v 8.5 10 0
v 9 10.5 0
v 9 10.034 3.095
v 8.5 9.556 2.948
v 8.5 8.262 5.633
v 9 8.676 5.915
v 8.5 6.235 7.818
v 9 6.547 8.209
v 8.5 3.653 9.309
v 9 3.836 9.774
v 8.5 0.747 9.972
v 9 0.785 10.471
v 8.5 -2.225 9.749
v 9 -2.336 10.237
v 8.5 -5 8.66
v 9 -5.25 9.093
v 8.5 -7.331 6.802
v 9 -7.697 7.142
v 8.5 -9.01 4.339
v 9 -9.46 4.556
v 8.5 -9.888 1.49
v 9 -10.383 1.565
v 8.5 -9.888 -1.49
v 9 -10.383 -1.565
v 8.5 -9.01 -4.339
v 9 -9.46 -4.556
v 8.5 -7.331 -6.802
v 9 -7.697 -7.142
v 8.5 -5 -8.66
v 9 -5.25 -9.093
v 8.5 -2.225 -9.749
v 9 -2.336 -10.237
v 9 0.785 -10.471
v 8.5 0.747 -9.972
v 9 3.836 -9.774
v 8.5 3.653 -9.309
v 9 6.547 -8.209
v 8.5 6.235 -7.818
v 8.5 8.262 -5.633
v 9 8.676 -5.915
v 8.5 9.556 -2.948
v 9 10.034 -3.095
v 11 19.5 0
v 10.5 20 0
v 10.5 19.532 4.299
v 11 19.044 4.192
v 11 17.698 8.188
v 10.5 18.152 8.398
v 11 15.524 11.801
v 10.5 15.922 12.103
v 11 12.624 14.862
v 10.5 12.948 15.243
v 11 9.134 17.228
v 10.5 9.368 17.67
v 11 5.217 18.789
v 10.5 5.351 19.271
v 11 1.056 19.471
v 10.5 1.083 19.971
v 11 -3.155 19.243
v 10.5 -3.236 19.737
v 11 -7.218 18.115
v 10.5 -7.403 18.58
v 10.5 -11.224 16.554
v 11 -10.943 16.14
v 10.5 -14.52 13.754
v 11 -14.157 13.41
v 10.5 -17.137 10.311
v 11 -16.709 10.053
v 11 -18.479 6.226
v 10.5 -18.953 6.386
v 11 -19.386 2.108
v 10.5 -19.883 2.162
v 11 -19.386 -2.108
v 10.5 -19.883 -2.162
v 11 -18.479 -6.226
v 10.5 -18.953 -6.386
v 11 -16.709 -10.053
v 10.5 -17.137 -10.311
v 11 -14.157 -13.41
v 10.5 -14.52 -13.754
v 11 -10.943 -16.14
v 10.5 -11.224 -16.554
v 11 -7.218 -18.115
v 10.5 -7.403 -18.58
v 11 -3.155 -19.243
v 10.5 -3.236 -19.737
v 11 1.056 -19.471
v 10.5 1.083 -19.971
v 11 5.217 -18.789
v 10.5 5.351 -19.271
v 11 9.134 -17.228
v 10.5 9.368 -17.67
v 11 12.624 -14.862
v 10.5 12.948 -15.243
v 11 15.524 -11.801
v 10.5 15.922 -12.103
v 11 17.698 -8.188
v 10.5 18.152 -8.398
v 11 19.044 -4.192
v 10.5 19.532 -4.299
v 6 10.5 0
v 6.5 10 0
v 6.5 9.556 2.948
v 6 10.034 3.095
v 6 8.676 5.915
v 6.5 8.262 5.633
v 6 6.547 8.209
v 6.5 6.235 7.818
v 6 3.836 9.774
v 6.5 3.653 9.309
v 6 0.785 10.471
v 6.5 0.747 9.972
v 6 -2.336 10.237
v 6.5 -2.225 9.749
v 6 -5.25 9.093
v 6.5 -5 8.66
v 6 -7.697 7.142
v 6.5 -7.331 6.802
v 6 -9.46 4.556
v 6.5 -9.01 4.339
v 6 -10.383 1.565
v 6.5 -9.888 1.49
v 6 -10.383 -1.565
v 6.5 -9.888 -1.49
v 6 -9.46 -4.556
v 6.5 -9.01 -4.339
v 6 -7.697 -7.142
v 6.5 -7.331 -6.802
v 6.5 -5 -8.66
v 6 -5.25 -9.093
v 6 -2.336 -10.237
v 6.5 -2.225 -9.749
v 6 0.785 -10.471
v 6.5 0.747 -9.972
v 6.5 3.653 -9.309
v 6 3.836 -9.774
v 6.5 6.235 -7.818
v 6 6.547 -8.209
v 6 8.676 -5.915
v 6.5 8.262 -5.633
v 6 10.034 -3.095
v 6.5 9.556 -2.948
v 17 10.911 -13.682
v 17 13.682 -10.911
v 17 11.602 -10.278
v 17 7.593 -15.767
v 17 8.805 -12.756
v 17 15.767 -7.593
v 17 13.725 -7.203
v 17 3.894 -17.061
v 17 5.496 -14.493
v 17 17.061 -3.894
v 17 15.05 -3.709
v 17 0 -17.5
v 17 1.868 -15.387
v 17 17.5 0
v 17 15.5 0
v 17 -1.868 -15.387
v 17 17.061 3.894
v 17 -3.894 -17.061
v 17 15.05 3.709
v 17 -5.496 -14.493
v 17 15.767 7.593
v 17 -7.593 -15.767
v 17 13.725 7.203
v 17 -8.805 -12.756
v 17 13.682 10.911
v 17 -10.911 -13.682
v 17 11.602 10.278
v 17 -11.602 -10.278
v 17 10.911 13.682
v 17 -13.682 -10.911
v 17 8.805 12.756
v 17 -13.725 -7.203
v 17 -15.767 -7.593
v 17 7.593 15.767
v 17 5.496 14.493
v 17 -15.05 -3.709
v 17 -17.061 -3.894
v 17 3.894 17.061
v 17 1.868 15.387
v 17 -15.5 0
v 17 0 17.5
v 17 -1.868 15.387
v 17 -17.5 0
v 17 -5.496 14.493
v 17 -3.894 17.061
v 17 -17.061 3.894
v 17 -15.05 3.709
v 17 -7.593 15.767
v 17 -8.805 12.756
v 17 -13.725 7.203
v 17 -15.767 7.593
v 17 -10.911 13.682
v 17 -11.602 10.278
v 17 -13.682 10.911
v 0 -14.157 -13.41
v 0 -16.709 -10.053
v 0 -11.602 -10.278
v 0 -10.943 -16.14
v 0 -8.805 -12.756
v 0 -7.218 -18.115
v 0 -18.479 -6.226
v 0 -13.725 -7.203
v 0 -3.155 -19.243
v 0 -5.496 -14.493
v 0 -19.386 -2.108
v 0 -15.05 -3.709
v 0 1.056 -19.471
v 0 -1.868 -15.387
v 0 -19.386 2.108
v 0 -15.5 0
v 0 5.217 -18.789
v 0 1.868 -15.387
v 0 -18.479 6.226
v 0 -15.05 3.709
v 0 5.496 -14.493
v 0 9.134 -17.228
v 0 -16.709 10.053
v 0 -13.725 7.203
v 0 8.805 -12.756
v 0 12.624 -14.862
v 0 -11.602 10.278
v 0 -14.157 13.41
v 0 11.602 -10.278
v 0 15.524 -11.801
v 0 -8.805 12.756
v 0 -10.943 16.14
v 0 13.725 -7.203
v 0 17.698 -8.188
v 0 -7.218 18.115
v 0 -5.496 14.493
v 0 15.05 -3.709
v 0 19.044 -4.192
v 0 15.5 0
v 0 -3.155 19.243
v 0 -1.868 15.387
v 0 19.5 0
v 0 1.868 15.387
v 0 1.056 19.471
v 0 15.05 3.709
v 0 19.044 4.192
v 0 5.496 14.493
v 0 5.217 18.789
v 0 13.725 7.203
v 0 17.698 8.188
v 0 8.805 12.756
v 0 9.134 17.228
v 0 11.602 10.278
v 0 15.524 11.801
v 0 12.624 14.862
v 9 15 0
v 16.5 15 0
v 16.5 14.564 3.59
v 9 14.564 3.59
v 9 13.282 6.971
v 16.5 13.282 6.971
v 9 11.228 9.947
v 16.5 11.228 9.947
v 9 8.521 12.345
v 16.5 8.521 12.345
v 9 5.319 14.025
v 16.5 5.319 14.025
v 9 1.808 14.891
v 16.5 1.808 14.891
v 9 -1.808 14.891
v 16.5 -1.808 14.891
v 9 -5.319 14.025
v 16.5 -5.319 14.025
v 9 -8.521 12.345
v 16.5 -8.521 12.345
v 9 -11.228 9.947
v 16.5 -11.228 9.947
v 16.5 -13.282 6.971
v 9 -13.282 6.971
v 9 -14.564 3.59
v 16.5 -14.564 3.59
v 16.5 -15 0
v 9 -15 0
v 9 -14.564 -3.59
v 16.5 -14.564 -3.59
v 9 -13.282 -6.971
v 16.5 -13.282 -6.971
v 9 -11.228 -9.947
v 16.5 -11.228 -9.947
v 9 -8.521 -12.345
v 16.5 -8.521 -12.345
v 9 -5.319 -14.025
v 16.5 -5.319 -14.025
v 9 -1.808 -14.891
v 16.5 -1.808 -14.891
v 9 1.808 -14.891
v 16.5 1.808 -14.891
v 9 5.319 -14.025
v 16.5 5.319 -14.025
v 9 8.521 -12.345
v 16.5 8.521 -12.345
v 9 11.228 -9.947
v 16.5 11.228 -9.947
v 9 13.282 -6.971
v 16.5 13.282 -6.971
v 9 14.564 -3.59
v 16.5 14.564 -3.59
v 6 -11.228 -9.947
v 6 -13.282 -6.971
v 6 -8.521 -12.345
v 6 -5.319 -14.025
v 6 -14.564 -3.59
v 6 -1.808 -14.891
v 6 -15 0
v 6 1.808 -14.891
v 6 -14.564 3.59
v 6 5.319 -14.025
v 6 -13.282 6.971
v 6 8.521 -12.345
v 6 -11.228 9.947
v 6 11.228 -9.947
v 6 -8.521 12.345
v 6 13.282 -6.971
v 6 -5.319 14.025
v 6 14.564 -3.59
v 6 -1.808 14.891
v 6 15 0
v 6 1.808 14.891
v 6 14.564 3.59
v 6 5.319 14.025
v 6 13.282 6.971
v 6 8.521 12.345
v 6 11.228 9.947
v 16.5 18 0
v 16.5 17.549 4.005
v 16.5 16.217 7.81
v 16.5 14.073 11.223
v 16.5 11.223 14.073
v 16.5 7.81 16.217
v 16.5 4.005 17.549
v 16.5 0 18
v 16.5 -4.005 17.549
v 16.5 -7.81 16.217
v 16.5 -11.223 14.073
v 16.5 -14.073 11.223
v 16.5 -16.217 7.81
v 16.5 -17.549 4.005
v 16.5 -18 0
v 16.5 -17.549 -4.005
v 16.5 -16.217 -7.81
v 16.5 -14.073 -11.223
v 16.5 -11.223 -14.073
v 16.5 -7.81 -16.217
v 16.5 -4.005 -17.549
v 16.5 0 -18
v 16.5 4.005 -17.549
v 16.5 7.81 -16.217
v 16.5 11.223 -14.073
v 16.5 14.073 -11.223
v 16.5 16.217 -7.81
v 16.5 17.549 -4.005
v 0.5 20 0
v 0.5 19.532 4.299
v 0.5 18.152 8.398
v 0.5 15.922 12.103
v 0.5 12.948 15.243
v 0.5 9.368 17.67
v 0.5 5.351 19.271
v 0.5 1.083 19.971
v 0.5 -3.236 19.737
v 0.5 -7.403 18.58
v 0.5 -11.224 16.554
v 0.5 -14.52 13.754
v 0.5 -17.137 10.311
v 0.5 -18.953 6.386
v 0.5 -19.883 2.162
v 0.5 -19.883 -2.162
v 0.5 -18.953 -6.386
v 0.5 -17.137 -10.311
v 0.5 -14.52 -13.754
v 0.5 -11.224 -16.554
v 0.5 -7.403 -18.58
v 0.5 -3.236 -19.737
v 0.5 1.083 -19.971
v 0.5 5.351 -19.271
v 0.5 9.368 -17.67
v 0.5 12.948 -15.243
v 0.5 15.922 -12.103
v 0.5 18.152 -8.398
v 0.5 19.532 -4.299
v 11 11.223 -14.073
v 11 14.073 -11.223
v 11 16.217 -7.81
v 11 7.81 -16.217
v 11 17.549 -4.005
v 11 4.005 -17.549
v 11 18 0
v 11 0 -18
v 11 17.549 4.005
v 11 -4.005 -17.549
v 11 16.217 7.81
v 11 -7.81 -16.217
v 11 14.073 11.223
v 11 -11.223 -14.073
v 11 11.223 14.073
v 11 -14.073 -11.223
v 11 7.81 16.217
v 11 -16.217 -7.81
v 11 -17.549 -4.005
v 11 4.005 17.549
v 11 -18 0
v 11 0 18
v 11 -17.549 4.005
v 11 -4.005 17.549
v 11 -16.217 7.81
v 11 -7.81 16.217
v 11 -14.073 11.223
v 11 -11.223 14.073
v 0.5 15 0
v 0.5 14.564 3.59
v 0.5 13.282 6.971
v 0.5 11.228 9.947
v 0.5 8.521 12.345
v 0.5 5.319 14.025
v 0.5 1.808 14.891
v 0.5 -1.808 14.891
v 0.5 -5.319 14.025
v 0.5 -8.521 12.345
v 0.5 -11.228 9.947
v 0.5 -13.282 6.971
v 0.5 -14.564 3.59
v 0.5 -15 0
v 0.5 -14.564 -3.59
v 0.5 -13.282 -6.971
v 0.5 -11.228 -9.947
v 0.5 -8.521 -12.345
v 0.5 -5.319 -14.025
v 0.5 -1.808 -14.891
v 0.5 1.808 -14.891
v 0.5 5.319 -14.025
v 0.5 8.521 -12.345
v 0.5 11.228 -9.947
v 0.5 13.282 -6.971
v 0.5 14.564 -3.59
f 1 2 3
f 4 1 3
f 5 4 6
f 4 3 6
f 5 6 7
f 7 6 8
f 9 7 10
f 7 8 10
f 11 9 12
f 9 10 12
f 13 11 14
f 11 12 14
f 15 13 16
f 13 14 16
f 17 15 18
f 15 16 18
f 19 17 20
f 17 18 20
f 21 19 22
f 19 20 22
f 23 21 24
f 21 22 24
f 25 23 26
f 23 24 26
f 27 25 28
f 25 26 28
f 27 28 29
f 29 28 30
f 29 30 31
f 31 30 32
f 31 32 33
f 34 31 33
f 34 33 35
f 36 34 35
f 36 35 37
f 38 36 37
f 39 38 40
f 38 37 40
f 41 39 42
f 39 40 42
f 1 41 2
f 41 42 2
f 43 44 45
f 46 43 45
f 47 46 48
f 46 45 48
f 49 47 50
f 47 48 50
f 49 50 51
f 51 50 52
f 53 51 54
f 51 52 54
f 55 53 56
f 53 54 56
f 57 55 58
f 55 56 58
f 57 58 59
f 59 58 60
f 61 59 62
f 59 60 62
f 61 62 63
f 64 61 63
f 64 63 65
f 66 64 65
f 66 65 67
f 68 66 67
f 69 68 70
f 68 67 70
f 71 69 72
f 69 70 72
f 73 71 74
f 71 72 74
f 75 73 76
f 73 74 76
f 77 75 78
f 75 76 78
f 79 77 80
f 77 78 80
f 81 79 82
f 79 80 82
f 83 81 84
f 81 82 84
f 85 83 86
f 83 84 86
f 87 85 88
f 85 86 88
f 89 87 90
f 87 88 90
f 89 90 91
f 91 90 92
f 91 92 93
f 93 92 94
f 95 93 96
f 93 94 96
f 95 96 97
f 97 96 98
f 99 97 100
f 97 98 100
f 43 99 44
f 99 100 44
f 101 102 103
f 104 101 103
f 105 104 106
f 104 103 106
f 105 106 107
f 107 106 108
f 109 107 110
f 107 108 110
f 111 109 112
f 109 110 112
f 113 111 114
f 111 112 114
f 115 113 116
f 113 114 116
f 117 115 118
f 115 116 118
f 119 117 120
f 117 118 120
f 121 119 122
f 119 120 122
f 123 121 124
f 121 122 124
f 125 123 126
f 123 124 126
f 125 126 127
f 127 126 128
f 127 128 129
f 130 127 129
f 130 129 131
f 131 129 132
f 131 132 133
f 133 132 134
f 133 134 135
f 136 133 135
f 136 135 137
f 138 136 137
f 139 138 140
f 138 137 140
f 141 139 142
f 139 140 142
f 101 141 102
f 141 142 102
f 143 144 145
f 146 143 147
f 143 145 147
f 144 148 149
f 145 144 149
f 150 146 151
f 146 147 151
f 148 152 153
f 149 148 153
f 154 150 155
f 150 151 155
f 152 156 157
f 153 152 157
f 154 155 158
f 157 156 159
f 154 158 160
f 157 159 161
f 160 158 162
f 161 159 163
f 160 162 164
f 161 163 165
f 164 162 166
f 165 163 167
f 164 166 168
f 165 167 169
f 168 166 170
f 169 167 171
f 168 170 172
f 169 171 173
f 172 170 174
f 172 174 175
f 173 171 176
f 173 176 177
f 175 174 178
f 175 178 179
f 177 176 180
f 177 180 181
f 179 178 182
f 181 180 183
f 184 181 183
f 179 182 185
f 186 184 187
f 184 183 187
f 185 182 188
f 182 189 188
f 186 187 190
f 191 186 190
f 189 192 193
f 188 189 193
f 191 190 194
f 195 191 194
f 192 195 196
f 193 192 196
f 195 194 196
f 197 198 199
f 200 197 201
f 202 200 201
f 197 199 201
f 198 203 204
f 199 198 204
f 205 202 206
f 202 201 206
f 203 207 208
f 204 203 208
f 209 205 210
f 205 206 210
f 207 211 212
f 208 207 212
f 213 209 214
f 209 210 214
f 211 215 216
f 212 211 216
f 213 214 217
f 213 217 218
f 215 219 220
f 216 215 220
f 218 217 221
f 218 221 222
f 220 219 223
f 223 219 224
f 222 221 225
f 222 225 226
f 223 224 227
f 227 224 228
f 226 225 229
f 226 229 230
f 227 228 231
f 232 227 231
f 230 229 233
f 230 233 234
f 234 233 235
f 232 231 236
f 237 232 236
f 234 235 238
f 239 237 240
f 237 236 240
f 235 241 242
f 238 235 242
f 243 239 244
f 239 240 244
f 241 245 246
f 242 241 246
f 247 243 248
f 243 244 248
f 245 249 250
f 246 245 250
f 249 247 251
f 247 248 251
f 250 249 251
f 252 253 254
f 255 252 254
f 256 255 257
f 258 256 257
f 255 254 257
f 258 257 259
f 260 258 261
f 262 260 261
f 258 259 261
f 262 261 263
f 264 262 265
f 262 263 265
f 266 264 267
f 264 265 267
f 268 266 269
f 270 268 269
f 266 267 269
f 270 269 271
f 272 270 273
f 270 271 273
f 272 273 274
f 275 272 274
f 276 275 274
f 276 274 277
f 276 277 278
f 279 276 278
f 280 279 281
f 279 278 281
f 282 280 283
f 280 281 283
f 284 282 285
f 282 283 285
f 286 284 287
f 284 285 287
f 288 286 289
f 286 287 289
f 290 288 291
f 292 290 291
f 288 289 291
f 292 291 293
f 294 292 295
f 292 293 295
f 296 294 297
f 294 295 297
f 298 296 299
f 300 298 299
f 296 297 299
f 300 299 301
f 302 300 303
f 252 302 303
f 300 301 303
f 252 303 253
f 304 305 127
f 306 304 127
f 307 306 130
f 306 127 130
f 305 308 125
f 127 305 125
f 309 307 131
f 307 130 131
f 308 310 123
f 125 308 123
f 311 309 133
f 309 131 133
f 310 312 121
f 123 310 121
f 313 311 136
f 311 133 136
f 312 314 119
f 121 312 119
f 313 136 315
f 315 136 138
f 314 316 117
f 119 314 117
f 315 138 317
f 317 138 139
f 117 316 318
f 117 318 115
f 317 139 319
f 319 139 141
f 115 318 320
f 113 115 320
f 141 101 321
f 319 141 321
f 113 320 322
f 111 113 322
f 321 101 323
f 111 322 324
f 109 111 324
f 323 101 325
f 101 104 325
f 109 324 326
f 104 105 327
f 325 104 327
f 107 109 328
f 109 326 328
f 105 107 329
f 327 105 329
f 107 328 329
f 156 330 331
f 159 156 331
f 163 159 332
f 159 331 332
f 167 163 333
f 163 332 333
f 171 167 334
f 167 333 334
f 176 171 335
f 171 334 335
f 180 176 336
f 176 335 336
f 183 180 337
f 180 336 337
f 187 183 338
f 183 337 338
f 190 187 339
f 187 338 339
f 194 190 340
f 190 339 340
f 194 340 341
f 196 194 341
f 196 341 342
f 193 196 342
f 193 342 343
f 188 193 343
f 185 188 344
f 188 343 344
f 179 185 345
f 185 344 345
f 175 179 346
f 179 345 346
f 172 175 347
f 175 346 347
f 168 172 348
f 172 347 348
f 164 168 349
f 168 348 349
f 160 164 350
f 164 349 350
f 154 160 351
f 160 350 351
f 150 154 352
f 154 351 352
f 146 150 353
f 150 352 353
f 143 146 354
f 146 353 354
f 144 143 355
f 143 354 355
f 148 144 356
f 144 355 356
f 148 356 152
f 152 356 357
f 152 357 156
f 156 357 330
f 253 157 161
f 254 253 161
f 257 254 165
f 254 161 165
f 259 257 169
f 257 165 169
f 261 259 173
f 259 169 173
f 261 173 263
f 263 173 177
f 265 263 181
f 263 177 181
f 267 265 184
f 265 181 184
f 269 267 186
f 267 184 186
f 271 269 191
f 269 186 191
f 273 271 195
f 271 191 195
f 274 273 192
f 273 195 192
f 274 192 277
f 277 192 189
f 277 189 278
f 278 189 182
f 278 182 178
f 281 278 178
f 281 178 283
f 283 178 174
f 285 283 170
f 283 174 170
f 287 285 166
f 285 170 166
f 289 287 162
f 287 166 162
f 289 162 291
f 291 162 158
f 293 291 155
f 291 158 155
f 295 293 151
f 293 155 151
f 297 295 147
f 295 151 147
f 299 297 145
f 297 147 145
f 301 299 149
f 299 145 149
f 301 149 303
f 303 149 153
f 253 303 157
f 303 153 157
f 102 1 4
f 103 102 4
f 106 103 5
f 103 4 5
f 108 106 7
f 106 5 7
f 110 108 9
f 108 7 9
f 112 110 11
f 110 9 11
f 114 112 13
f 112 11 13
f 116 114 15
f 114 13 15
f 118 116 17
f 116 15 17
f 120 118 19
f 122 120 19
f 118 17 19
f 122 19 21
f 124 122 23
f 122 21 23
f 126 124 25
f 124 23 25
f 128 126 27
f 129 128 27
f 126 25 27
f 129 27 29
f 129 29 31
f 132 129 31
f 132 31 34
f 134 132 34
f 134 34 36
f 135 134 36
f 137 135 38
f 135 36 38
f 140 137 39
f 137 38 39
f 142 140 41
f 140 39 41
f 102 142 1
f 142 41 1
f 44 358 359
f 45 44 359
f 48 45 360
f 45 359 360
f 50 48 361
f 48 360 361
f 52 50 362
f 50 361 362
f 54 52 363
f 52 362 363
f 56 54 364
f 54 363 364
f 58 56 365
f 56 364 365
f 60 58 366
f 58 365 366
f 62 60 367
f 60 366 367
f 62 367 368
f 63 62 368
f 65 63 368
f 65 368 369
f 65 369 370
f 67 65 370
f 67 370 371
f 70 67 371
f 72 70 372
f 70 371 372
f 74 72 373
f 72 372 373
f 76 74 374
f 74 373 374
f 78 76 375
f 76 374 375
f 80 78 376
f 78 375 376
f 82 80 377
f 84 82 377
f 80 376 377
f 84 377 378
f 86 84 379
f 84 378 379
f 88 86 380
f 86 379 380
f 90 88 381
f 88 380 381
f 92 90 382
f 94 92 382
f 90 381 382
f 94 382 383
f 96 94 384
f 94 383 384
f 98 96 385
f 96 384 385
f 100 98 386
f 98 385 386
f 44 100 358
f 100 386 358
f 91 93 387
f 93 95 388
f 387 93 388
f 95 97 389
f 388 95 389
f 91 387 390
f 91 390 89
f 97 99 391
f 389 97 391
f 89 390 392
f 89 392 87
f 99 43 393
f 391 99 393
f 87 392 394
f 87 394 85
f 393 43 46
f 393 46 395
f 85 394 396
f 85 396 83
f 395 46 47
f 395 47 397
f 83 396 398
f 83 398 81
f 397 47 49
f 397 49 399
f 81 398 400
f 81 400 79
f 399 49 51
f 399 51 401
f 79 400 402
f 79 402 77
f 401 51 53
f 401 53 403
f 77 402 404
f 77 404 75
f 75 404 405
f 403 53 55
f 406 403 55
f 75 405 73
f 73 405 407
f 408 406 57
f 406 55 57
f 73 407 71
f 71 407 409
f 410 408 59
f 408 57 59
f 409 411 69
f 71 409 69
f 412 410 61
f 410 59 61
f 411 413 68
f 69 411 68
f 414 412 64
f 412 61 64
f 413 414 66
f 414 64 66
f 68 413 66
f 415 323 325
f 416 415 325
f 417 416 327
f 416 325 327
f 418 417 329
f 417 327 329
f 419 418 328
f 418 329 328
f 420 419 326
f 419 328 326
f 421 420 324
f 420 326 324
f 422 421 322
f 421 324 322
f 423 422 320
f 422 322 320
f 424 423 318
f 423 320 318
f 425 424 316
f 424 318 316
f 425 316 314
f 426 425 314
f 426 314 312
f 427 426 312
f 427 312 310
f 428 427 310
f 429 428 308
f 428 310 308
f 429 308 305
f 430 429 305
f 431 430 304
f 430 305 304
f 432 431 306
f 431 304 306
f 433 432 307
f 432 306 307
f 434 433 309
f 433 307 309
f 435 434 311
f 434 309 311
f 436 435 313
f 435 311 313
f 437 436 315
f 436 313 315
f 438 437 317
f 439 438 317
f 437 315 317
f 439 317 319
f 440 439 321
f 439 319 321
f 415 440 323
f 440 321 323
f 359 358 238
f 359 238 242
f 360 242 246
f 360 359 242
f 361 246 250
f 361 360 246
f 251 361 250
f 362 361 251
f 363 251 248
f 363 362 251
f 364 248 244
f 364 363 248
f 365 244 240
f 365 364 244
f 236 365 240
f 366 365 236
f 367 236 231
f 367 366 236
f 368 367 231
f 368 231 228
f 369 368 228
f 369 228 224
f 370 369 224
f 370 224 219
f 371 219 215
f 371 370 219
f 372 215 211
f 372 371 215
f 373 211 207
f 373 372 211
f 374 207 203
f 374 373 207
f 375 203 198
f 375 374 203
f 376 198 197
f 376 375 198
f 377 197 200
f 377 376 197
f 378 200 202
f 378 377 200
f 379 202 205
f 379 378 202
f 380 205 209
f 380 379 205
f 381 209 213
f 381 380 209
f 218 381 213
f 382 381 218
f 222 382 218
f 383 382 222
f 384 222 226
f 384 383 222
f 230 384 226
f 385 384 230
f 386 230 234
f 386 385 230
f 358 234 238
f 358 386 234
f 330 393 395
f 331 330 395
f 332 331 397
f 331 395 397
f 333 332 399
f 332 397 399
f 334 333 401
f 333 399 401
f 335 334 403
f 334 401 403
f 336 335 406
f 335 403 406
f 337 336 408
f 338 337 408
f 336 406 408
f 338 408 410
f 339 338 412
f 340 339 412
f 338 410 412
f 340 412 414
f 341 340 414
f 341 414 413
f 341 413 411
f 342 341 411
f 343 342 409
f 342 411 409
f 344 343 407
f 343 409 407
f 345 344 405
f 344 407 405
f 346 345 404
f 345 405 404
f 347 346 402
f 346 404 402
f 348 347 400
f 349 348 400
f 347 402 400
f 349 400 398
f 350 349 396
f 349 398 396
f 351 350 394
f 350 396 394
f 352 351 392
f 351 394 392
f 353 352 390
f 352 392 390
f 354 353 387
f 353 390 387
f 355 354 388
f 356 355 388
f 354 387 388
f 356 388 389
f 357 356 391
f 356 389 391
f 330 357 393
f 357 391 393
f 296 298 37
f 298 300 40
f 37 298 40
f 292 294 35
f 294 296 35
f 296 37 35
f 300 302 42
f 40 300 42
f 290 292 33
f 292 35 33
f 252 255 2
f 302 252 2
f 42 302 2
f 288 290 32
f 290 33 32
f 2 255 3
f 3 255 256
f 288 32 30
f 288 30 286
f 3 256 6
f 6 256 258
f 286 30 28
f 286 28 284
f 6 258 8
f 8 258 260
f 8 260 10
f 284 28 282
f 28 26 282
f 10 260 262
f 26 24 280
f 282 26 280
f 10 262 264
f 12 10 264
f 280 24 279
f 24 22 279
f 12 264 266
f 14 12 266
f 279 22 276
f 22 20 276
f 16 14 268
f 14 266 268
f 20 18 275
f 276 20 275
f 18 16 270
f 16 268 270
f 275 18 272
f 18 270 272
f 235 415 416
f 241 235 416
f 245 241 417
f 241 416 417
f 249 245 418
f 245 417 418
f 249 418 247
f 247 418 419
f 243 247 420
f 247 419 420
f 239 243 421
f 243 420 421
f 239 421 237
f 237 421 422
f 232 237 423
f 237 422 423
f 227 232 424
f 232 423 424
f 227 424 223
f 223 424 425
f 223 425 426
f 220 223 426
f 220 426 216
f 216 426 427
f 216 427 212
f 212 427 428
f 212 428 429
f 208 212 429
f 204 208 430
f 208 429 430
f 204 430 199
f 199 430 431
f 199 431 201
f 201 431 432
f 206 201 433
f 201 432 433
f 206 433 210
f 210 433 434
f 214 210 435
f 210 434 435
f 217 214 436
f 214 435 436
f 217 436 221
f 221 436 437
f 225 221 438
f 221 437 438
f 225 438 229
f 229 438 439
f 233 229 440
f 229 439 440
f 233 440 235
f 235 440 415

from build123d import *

# Parameters (mm, degrees)
F2_SIZE2 = 0.5
F2_SIZE  = 0.5


with BuildPart() as f1:
    # F0 (on Top) → F1 (revolve)
    with BuildSketch(Plane.XY):
        Polygon((0, 20), (0, 15), (6, 15), (6, 10), (9, 10), (9, 15), (17, 15), (17, 18), (11, 18), (11, 20), align=None)
    revolve(axis=Axis((8.5, 0, 0), (1, 0, 0)))

    # F2
    f2_edges = [f1.edges().sort_by_distance(p)[0] for p in [
        (0, -20, 0),
        (11, -20, 0),
        (17, -18, 0),
        (0, -15, 0),
        (6, -10, 0),
        (9, -10, 0),
        (17, -15, 0),
    ]]
    chamfer(f2_edges, length=F2_SIZE, length2=F2_SIZE2)


solid = f1.part
